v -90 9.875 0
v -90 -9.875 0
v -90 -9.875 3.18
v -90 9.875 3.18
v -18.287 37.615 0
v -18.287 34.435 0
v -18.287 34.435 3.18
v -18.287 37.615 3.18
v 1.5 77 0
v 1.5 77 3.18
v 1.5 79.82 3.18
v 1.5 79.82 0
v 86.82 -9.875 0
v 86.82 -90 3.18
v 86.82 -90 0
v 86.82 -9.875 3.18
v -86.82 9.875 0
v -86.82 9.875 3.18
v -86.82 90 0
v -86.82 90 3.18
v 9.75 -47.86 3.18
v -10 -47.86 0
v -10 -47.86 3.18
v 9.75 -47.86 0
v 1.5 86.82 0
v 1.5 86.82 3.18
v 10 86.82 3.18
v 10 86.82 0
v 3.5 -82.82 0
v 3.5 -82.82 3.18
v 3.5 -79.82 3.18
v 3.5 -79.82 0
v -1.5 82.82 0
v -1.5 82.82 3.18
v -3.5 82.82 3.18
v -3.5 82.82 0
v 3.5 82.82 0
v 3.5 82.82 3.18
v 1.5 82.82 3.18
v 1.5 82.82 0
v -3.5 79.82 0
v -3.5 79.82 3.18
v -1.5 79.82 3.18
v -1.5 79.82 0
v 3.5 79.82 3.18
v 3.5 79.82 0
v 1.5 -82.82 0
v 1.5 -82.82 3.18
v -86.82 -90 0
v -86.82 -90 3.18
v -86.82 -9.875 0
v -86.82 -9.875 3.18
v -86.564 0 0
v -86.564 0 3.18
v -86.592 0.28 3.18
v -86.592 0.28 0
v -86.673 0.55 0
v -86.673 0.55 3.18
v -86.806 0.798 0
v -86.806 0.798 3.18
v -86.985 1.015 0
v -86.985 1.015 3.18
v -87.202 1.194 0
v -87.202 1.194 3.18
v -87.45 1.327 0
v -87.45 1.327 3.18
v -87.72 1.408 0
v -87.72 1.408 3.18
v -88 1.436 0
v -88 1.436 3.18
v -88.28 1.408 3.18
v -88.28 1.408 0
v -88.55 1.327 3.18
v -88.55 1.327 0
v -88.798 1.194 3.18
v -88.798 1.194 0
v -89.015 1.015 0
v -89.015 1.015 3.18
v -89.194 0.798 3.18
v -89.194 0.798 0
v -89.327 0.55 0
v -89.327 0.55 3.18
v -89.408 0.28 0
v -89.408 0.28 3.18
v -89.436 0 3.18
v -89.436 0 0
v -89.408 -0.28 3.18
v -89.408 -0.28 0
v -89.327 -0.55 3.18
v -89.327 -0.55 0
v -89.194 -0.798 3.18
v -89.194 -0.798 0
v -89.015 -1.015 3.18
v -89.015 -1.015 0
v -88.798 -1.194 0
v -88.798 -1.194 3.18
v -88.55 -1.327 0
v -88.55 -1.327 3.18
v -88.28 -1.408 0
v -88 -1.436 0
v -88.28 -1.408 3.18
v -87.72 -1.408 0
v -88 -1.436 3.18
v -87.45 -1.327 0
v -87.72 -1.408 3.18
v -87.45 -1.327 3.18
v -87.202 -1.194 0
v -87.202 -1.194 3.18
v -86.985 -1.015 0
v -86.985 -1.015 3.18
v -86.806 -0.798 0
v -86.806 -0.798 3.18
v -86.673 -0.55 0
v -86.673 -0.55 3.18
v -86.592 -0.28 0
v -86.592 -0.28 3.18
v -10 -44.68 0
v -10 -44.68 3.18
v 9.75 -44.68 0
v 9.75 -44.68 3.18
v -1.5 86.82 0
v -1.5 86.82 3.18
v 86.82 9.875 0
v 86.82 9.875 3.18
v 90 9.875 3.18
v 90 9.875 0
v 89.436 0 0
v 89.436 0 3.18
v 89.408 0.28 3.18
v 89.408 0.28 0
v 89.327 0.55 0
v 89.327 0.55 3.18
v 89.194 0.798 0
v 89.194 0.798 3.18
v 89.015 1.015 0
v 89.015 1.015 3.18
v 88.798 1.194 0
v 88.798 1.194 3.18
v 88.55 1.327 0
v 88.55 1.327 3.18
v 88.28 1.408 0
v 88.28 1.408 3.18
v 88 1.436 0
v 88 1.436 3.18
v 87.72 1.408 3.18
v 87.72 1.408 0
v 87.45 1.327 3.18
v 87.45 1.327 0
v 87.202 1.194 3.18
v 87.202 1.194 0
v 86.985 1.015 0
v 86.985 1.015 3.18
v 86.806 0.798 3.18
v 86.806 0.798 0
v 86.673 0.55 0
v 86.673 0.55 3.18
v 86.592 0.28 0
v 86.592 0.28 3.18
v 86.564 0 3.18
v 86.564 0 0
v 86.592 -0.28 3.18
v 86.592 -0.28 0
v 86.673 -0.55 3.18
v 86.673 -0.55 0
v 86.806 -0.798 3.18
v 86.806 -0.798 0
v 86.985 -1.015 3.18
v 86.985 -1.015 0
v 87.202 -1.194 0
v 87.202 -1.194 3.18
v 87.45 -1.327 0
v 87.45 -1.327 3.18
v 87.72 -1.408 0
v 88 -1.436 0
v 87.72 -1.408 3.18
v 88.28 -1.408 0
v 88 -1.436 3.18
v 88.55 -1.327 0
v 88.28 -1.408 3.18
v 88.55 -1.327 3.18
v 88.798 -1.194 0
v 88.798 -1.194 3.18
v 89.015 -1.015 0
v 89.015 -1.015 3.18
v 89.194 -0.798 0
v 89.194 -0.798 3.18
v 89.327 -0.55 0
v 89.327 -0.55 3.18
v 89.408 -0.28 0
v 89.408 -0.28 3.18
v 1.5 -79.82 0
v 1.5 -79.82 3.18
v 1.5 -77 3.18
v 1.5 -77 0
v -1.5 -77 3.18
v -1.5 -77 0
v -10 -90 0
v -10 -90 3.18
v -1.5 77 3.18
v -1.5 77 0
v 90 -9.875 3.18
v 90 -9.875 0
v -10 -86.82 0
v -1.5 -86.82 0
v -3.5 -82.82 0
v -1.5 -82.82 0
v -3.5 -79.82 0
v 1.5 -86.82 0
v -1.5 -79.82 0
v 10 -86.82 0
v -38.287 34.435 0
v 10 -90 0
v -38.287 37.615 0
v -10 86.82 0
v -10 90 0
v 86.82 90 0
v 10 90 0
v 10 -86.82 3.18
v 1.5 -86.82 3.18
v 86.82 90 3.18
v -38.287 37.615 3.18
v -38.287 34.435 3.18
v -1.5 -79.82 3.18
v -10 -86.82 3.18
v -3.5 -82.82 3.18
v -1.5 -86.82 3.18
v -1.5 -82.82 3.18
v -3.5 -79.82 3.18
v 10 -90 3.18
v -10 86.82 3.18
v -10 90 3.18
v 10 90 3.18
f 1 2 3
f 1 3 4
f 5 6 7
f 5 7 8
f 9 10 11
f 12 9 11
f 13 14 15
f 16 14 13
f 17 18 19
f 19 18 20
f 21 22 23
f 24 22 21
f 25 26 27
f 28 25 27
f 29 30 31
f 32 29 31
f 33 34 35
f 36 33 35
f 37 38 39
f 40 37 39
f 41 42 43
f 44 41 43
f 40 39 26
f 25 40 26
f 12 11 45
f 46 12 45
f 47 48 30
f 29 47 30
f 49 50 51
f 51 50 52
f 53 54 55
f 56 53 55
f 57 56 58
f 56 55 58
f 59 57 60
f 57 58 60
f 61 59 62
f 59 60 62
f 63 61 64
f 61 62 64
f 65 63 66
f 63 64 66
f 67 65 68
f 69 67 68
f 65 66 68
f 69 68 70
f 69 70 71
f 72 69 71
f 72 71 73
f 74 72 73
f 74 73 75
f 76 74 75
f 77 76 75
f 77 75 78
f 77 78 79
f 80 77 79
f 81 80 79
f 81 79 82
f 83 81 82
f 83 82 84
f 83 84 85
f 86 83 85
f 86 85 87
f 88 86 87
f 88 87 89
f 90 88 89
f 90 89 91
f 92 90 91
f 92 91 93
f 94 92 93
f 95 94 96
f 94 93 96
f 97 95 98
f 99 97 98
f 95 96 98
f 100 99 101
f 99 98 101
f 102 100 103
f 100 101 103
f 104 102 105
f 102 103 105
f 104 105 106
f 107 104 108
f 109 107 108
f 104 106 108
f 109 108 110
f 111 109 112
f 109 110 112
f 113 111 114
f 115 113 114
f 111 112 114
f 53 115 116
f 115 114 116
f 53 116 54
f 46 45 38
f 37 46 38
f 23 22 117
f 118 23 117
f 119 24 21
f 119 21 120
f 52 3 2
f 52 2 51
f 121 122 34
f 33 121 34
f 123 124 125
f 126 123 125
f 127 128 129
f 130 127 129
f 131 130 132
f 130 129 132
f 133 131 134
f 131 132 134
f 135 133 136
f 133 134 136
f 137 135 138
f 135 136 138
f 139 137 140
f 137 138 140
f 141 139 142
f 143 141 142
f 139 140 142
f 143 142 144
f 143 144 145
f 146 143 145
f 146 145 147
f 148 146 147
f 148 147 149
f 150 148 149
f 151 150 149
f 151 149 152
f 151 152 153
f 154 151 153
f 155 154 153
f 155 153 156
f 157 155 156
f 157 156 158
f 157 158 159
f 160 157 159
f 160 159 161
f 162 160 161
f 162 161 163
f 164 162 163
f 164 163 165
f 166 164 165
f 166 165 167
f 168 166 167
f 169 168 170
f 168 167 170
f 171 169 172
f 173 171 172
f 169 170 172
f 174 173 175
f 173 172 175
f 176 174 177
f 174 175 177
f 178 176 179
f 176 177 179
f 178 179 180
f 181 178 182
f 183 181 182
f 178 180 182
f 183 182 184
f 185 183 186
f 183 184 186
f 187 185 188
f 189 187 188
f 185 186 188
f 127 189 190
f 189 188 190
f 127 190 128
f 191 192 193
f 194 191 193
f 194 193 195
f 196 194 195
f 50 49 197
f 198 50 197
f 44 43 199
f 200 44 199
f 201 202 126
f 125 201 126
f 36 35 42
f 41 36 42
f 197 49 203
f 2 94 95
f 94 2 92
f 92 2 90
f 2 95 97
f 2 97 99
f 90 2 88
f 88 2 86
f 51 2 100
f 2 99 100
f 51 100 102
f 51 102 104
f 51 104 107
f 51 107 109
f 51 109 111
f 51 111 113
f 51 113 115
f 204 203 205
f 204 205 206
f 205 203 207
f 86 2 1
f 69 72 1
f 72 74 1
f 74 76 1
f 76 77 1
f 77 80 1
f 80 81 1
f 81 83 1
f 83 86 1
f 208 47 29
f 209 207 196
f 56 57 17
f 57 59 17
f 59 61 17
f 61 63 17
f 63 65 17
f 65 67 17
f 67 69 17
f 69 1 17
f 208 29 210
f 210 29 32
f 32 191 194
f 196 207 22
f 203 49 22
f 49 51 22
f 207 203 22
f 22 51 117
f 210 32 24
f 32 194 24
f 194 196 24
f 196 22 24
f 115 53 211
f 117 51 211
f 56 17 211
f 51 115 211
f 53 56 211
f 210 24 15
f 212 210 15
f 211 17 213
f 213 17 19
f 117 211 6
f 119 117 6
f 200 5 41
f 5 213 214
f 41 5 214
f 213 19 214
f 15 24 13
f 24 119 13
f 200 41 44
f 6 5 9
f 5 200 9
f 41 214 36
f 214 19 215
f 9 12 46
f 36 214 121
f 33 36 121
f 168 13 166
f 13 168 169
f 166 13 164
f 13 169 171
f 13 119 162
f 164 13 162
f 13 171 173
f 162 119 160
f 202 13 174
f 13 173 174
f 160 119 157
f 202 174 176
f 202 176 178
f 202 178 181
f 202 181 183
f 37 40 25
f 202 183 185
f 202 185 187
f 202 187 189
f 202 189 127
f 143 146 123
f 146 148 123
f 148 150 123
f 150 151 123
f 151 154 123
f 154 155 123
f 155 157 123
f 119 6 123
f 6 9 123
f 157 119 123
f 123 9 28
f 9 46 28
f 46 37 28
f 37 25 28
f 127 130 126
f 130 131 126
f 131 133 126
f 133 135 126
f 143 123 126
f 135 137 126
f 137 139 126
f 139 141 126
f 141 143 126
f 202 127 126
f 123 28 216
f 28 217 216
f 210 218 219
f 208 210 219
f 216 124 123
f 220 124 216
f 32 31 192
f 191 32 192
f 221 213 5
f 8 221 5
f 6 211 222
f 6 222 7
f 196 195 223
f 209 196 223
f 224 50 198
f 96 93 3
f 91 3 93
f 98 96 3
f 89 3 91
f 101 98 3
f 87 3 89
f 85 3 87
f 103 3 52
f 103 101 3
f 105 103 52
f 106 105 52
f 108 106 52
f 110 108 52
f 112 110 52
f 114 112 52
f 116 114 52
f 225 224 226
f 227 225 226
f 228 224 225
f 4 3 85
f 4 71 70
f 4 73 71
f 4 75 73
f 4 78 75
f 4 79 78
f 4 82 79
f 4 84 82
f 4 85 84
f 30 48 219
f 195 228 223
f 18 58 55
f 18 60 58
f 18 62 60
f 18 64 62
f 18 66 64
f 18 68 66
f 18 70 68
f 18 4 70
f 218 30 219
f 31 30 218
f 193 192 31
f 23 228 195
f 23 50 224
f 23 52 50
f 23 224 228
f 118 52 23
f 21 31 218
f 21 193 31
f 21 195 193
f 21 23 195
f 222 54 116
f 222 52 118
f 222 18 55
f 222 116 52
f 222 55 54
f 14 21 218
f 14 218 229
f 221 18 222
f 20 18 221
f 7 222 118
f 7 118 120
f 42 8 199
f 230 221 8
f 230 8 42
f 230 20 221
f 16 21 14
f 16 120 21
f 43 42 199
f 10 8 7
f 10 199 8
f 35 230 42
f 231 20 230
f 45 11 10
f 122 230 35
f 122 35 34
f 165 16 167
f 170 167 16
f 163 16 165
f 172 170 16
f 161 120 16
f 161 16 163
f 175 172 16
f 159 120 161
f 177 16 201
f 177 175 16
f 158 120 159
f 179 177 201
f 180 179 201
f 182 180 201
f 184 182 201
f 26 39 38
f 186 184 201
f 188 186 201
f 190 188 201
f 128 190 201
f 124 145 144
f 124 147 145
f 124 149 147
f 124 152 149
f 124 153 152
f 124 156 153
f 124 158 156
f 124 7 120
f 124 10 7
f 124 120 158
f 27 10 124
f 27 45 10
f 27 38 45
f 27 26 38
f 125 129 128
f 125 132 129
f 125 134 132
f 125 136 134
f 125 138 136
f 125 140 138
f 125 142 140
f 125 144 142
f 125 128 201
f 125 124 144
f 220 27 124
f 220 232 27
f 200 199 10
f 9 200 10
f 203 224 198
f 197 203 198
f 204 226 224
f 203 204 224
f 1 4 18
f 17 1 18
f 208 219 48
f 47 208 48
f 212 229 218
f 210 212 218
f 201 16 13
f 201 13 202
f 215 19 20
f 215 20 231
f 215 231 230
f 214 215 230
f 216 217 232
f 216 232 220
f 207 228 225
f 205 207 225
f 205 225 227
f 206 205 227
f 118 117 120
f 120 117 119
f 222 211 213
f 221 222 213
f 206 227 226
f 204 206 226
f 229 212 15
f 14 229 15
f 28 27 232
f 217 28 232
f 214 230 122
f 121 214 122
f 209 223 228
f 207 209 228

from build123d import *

# Parameters (mm, degrees)
SKETCH3_W           = 180
SKETCH3_H           = 180
SKETCH3_W_2         = 20
SKETCH3_H_2         = 3.18
SKETCH3_W_3         = 19.75
BOSS_EXTRUDE1_DEPTH = 3.18
CUT_EXTRUDE1_DEPTH  = 128.318939675
SKETCH5_R           = 1.436023081
SKETCH5_W           = 3.18
SKETCH5_H           = 80.125
CUT_EXTRUDE2_DEPTH  = 128.318939675


with BuildPart() as part:
    # Sketch3 → Boss-Extrude1 (new body)
    with BuildSketch(Plane.XY):
        Rectangle(SKETCH3_W, SKETCH3_H)
        with Locations((-28.286899392, 36.024803222)):
            Rectangle(SKETCH3_W_2, SKETCH3_H_2, mode=Mode.SUBTRACT)
        with Locations((-0.125, -46.269729843)):
            Rectangle(SKETCH3_W_3, SKETCH3_H_2, mode=Mode.SUBTRACT)
    extrude(amount=BOSS_EXTRUDE1_DEPTH)

    # Sketch4 → Cut-Extrude1 (cut, through all)
    with BuildSketch(Plane.XY.offset(3.18)):
        Polygon((1.5, 86.82), (10, 86.82), (10, 90), (-10, 90), (-10, 86.82), (-1.5, 86.82), (-1.5, 82.82), (-3.5, 82.82), (-3.5, 79.82), (-1.5, 79.82), (-1.5, 77), (1.5, 77), (1.5, 79.82), (3.5, 79.82), (3.5, 82.82), (1.5, 82.82), align=None)
        Polygon((1.5, -79.82), (1.5, -77), (-1.5, -77), (-1.5, -79.82), (-3.5, -79.82), (-3.5, -82.82), (-1.5, -82.82), (-1.5, -86.82), (-10, -86.82), (-10, -90), (10, -90), (10, -86.82), (1.5, -86.82), (1.5, -82.82), (3.5, -82.82), (3.5, -79.82), align=None)
    extrude(amount=-CUT_EXTRUDE1_DEPTH, mode=Mode.SUBTRACT)

    # Sketch5 → Cut-Extrude2 (cut, through all)
    with BuildSketch(Plane.XY.offset(3.18)):
        with Locations((-88, 0)):
            Circle(SKETCH5_R)
        with Locations((88, 0)):
            Circle(SKETCH5_R)
        with Locations((-88.41, 49.9375)):
            Rectangle(SKETCH5_W, SKETCH5_H)
        with Locations((-88.41, -49.9375)):
            Rectangle(SKETCH5_W, SKETCH5_H)
        with Locations((88.41, -49.9375)):
            Rectangle(SKETCH5_W, SKETCH5_H)
        with Locations((88.41, 49.9375)):
            Rectangle(SKETCH5_W, SKETCH5_H)
    extrude(amount=-CUT_EXTRUDE2_DEPTH, mode=Mode.SUBTRACT)


solid = part.part
